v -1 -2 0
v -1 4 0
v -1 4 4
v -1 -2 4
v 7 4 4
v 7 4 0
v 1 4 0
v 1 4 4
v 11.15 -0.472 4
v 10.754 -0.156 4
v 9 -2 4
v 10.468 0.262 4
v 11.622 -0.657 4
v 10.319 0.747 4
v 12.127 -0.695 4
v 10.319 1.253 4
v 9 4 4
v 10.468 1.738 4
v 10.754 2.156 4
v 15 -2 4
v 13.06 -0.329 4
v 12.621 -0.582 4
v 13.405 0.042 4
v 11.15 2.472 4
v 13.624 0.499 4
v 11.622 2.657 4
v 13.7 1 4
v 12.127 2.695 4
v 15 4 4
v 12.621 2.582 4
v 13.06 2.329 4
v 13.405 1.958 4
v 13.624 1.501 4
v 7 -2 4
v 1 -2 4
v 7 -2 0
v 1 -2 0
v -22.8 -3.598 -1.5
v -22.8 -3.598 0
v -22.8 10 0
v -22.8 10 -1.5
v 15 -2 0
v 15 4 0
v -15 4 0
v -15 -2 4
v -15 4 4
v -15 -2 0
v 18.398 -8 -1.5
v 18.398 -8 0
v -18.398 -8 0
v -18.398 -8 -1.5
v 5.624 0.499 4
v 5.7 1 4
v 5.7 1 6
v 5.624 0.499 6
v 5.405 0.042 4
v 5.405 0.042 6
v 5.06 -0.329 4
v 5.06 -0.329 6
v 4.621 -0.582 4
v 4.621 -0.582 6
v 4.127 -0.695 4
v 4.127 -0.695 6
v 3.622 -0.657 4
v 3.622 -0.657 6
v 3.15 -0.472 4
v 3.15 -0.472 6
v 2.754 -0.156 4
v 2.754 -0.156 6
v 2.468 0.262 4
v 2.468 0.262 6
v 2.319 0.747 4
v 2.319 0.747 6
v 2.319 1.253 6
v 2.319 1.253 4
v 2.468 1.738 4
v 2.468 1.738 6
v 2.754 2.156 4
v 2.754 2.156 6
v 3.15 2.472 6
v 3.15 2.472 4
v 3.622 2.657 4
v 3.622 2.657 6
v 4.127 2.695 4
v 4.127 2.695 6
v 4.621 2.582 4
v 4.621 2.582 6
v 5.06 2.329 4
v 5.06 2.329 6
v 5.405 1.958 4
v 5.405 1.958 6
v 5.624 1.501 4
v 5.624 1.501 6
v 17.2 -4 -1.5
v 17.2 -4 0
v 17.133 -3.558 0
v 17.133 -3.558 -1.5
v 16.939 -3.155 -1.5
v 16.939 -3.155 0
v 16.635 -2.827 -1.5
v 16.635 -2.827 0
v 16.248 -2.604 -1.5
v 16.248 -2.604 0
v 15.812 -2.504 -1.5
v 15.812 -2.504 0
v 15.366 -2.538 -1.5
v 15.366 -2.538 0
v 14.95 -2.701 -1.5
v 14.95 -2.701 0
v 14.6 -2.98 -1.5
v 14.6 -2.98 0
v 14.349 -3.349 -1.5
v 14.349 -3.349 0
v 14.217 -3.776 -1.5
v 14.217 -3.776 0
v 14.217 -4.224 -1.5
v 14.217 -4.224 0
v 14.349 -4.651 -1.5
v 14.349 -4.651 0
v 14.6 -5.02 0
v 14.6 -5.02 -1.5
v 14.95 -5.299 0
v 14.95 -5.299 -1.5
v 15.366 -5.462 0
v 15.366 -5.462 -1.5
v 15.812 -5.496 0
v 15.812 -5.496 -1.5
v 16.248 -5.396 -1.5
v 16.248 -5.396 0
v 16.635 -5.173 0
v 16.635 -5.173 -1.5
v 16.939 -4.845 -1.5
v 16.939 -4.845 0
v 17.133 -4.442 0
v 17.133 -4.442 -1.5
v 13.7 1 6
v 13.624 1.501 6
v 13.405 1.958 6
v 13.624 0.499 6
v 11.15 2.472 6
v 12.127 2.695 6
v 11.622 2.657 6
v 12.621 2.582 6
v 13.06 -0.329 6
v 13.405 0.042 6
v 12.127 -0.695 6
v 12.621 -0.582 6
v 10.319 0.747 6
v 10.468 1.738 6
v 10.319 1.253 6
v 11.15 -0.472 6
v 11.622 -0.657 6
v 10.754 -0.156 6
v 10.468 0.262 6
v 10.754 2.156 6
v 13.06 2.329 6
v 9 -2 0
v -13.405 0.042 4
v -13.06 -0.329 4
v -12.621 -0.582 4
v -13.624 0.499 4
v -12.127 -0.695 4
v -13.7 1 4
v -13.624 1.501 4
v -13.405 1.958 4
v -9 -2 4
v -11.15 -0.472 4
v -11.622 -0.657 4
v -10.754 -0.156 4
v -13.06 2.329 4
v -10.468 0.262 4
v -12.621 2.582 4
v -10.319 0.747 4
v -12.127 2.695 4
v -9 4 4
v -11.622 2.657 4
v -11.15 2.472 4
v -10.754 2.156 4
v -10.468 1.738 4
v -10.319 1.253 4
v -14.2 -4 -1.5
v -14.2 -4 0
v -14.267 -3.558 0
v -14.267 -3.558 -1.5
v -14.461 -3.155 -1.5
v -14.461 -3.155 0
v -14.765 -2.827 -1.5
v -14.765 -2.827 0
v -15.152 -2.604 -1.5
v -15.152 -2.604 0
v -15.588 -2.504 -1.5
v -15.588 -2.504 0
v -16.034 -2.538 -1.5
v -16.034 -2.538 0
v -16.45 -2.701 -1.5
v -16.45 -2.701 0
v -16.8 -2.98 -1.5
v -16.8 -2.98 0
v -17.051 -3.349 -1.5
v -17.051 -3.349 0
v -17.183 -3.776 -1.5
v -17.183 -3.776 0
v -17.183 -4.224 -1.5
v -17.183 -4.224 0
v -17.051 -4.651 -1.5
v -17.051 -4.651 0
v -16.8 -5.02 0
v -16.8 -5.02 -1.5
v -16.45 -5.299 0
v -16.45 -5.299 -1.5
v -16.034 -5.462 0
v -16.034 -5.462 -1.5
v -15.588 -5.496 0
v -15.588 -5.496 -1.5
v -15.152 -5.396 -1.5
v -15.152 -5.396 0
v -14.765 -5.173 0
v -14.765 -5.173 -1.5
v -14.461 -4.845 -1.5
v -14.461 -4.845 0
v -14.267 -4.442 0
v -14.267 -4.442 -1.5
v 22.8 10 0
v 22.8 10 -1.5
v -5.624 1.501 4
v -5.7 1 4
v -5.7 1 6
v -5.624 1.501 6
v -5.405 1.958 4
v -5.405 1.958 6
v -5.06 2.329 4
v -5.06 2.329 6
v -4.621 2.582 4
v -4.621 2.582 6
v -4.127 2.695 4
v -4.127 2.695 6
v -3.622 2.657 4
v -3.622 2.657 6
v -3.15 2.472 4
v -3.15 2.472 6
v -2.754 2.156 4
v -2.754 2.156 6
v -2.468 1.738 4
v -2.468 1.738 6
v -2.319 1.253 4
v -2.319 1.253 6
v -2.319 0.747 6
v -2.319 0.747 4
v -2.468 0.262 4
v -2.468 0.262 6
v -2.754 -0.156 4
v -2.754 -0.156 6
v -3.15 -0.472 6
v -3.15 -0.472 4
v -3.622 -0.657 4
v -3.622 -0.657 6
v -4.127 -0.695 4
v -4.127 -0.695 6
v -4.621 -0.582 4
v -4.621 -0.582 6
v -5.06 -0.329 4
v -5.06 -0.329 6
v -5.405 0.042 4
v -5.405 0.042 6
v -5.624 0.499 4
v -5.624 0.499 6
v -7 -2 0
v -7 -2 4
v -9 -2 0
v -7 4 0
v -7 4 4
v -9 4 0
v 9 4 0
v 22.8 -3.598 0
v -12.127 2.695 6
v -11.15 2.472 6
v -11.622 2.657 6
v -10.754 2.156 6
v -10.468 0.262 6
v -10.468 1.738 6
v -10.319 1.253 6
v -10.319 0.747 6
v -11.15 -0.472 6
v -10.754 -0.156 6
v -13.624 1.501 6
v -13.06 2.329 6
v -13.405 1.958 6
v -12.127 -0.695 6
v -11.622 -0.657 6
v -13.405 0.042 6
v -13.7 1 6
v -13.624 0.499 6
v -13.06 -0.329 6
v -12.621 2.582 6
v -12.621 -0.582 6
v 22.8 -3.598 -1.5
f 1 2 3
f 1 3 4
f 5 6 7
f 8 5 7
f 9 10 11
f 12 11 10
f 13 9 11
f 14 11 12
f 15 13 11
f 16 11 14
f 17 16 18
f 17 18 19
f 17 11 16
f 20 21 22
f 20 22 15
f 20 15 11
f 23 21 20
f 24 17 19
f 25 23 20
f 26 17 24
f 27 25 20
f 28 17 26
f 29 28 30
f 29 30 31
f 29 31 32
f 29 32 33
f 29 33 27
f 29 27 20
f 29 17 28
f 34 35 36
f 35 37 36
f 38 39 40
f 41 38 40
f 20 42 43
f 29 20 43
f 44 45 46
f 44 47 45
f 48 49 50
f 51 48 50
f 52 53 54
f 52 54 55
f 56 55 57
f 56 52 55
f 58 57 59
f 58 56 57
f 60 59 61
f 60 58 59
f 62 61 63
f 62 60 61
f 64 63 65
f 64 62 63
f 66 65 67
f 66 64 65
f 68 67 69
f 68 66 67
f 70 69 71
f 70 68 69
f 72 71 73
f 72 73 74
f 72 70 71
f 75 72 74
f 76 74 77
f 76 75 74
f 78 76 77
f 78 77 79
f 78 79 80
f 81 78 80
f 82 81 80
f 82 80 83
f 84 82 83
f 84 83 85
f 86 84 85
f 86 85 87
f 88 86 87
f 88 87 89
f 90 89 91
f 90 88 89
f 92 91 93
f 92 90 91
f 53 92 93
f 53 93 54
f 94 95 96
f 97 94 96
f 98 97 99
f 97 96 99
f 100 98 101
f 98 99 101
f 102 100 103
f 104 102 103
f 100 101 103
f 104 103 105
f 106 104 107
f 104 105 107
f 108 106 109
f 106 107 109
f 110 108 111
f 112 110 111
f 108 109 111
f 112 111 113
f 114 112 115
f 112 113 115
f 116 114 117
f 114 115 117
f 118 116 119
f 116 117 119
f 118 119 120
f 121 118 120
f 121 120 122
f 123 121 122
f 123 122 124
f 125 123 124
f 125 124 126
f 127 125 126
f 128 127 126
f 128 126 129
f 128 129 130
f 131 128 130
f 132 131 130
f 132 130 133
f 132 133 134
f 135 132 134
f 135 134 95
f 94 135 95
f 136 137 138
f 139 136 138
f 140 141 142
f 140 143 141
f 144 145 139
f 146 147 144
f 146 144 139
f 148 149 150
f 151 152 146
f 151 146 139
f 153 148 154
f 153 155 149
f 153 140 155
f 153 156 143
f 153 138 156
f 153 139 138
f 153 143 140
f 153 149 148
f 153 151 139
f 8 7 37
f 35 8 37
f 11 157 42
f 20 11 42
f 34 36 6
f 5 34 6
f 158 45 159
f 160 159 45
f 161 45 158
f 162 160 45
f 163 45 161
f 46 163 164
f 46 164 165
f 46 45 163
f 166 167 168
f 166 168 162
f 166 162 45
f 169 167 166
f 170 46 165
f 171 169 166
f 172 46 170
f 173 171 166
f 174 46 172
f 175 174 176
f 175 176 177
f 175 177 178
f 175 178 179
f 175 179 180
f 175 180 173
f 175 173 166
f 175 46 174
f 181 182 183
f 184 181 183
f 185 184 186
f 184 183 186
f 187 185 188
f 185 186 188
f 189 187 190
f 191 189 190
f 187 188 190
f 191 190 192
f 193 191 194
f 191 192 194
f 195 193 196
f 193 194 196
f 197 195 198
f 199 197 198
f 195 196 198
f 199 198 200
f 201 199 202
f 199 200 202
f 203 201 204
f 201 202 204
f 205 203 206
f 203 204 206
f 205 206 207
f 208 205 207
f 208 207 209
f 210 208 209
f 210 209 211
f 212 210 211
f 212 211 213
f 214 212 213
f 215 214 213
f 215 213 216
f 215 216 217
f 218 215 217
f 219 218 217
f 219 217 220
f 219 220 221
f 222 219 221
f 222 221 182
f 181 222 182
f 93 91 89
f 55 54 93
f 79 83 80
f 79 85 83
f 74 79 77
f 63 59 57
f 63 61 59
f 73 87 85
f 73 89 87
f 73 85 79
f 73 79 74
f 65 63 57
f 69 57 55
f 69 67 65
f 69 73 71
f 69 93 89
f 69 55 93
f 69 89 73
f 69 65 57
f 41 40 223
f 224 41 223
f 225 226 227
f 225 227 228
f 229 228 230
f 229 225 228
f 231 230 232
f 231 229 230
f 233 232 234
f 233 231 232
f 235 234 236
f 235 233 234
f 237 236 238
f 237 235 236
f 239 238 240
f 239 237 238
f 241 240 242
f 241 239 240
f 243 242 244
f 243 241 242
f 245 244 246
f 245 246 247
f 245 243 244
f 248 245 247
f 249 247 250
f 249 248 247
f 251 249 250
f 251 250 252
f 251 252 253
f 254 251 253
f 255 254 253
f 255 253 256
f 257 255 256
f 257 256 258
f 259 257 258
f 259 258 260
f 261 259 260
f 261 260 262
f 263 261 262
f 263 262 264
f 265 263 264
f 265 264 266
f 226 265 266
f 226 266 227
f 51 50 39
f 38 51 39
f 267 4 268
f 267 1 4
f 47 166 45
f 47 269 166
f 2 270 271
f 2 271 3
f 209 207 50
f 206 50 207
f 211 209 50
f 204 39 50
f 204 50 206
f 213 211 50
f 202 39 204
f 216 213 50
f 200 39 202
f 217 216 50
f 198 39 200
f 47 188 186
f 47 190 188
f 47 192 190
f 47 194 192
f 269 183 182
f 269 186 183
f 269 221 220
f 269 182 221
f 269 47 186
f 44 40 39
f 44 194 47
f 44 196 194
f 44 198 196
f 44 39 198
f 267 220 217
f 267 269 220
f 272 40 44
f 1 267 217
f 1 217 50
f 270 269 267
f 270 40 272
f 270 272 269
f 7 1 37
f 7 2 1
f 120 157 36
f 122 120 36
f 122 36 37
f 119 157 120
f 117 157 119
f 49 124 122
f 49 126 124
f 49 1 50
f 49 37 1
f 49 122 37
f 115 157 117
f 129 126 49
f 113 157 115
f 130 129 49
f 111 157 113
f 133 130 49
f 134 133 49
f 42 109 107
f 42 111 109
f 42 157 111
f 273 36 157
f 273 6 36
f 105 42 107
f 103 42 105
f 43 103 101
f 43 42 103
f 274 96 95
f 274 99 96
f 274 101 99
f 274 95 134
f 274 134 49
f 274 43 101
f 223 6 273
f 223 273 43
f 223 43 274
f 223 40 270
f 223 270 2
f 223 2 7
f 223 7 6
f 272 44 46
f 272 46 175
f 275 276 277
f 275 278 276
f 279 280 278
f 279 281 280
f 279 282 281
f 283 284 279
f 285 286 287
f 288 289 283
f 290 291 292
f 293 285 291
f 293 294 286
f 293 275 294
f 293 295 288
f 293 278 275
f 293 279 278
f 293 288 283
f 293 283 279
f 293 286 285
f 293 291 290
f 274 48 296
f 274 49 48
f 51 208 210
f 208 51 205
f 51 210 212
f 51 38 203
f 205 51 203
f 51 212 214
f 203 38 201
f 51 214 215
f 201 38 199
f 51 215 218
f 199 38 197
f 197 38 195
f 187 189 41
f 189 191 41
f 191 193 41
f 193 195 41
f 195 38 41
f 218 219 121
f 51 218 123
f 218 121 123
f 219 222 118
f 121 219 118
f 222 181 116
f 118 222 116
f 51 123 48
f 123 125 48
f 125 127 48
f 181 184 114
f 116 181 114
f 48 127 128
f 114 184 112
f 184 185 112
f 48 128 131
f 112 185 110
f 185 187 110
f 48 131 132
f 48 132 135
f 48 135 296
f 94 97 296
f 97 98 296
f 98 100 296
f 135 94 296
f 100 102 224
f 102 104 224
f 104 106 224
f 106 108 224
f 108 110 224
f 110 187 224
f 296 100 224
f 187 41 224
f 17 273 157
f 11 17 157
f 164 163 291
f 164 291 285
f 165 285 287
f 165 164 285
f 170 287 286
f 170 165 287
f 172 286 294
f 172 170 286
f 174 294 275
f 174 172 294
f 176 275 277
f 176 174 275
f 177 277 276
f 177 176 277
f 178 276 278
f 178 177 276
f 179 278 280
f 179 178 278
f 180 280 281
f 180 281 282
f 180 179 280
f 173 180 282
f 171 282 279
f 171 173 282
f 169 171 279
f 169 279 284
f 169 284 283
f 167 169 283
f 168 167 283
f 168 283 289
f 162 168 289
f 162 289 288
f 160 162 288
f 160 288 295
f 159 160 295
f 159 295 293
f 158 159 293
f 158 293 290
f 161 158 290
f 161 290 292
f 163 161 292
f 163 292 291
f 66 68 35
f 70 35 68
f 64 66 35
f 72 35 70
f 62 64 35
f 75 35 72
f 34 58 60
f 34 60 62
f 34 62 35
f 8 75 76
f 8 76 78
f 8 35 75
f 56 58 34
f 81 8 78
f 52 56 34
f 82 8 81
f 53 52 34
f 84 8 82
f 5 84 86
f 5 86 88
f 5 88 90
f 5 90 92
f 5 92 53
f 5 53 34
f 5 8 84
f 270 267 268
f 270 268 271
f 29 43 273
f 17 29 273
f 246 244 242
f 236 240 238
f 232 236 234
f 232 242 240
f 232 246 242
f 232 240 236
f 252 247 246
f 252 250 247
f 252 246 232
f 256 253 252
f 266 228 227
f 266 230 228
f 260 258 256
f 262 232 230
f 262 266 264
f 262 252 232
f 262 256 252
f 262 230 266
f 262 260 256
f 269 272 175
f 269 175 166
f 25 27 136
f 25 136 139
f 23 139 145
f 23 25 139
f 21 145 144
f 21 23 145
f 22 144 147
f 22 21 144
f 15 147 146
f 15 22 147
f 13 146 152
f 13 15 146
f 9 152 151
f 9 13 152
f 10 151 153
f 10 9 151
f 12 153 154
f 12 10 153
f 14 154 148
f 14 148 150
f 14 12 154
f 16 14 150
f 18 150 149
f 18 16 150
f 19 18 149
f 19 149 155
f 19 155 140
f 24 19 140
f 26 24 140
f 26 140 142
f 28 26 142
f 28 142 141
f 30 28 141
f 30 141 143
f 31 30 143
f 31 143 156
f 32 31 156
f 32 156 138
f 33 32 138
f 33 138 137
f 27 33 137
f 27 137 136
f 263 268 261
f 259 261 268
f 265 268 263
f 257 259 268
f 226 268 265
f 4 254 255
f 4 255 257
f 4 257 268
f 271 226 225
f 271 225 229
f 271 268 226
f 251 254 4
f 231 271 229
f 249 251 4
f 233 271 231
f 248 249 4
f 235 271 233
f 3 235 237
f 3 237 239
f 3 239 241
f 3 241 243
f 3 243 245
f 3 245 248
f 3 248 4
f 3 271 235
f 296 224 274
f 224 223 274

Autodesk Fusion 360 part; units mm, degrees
sketch "Sketch1" plane through (0, 0, 0) normal (0, 0, 1) x (1, 0, 0)
  line L0 (-22.8, 10) -> (22.8, 10)
  line L1 (22.8, 10) -> (22.8, -10)
  line L2 (22.8, -10) -> (-22.8, -10)
  line L3 (-22.8, -10) -> (-22.8, 10)
  line L4 (-22.8, 10) -> (22.8, -10) construction
  line L5 (-15, 4) -> (-9, 4)
  line L6 (-9, 4) -> (-9, -2)
  line L7 (-9, -2) -> (-15, -2)
  line L8 (-15, -2) -> (-15, 4)
  line L9 (0, 10) -> (0, -10) construction
  line L10 (-1, -2) -> (-7, -2)
  line L11 (-7, -2) -> (-7, 4)
  line L12 (-7, 4) -> (-1, 4)
  line L13 (-1, 4) -> (-1, -2)
  line L14 (7, 4) -> (1, 4)
  line L15 (1, 4) -> (1, -2)
  line L16 (1, -2) -> (7, -2)
  line L17 (7, -2) -> (7, 4)
  line L18 (15, 4) -> (9, 4)
  line L19 (9, 4) -> (9, -2)
  line L20 (15, -2) -> (15, 4)
  line L21 (9, -2) -> (15, -2)
  circle A0 centre (-15.7, -4) radius 1.5
  circle A1 centre (15.7, -4) radius 1.5
  line L22 (-15.7, -4) -> (15.7, -4) construction
  dimension "d1" = 45.6
  dimension "d2" = 20
  dimension "d3" = 6
  dimension "d4" = 6
  dimension "d5" = 2
  dimension "d6" = 1
  dimension "d7" = 6
  dimension "d33" = 7.1
  dimension "d34" = 3
  dimension "d37" = 3
  dimension "d38" = 6
  dimension "d59" = 7.1
extrude "Extrude7" add sketch "Sketch1" against normal blind 1.5 contours L0 L1 L2 L3 | L5 L6 L7 L8 | L10 L11 L12 L13 | L14 L15 L16 L17 | L18 L19 L20 L21
extrude "Extrude8" add sketch "Sketch1" along normal blind 4 contours L5 L6 L7 L8 | L10 L11 L12 L13 | L14 L15 L16 L17 | L18 L19 L20 L21
sketch "Sketch6" plane through (0, 0, 4) normal (0, 0, 1) x (-1, 0, 0)
  line L0 (15, 2) -> (9, 2)
  line L1 (9, 2) -> (9, -4)
  line L2 (9, -4) -> (15, -4)
  line L3 (15, -4) -> (15, 2)
  line L4 (15, -4) -> (9, 2) construction
  circle A0 centre (12, -1) radius 1.7
  dimension "d44" = 3.4
sketch "Sketch7" plane through (0, 0, 4) normal (0, 0, 1) x (-1, 0, 0)
  line L0 (1, -4) -> (7, -4)
  line L1 (7, -4) -> (7, 2)
  line L2 (7, 2) -> (1, 2)
  line L3 (1, 2) -> (1, -4)
  line L4 (7, -4) -> (1, 2) construction
  circle A0 centre (4, -1) radius 1.7
  dimension "d45" = 3.4
extrude "Extrude9" add sketch "Sketch6" sketch "Sketch7" along normal blind 2 contours A0 of sketch 2 contours A0
mirror "Mirror2" about plane through (0, 0, 0) normal (1, 0, 0) of "Extrude9"
sketch "Sketch8" plane through (0, 0, 0) normal (0, 0, 1) x (-1, 0, 0)
  line L0 (-9, 2) -> (-9, -4)
  line L1 (-9, -4) -> (-15, -4)
  line L2 (-15, -4) -> (-15, 2)
  line L3 (-15, 2) -> (-9, 2)
  line L4 (15, 2) -> (15, -4)
  line L5 (15, -4) -> (9, -4)
  line L6 (9, -4) -> (9, 2)
  line L7 (9, 2) -> (15, 2)
  line L8 (-7, 2) -> (-1, 2)
  line L9 (-1, 2) -> (-1, -4)
  line L10 (-1, -4) -> (-7, -4)
  line L11 (-7, -4) -> (-7, 2)
  line L12 (1, -4) -> (1, 2)
  line L13 (1, 2) -> (7, 2)
  line L14 (7, 2) -> (7, -4)
  line L15 (7, -4) -> (1, -4)
  circle A0 centre (15.7, 4) radius 1.5
  circle A1 centre (-15.7, 4) radius 1.5
  line L16 (22.8, 10) -> (-22.8, 10)
  line L17 (-22.8, 10) -> (-22.8, -10)
  line L18 (-22.8, -10) -> (22.8, -10)
  line L19 (22.8, -10) -> (22.8, 10)
  line L20 (16.3985, 10) -> (22.8, 3.5985)
  line L21 (15.7, 4) -> (19.5993, 6.7993) construction
  line L22 (0, 0) -> (0, -10) construction
  line L23 (-16.3985, 10) -> (-22.8, 3.5985)
  dimension "d51" = 45
  dimension "d52" = 4.8
extrude "Extrude10" cut sketch "Sketch8" against normal blind 1.5 contours L16 L19 L20 | L16 L17 L23
move_face "OffsetFaces1" offset -2 1 faces at (5.4662, -10, -0.5)
extrude "Extrude1" [suppressed]
extrude "Extrude2" [suppressed]
sketch "Sketch2" plane through (0, 0, 4) normal (0, 0, 1) x (-1, 0, 0)
  line L0 (15, 2) -> (9, 2)
  line L1 (9, 2) -> (9, -4)
  line L2 (9, -4) -> (15, -4)
  line L3 (15, -4) -> (15, 2)
  circle A0 centre (12, -1) radius 2
  line L4 (15, -4) -> (9, 2) construction
  dimension "d12" = 4
extrude "Extrude3" [suppressed]
sketch "Sketch3" plane through (0, 0, 4) normal (0, 0, 1) x (-1, 0, 0)
  line L0 (1, -4) -> (7, -4)
  line L1 (7, -4) -> (7, 2)
  line L2 (7, 2) -> (1, 2)
  line L3 (1, 2) -> (1, -4)
  line L4 (7, -4) -> (1, 2) construction
  circle A0 centre (4, -1) radius 2
  dimension "d15" = 4
extrude "Extrude4" [suppressed]
mirror "Mirror1" [suppressed]
sketch "Sketch4" plane through (0, 0, 0) normal (0, 0, 1) x (-1, 0, 0)
  line L0 (-9, 2) -> (-9, -4)
  line L1 (-9, -4) -> (-15, -4)
  line L2 (-15, -4) -> (-15, 2)
  line L3 (-15, 2) -> (-9, 2)
  line L4 (15, 2) -> (15, -4)
  line L5 (15, -4) -> (9, -4)
  line L6 (9, -4) -> (9, 2)
  line L7 (9, 2) -> (15, 2)
  line L8 (-7, 2) -> (-1, 2)
  line L9 (-1, 2) -> (-1, -4)
  line L10 (-1, -4) -> (-7, -4)
  line L11 (-7, -4) -> (-7, 2)
  line L12 (1, -4) -> (1, 2)
  line L13 (1, 2) -> (7, 2)
  line L14 (7, 2) -> (7, -4)
  line L15 (7, -4) -> (1, -4)
  line L16 (22.8, 10) -> (-22.8, 10)
  line L17 (-22.8, 10) -> (-22.8, -10)
  line L18 (-22.8, -10) -> (22.8, -10)
  line L19 (22.8, -10) -> (22.8, 10)
  circle A0 centre (-19.6, -3.8) radius 1.5
  circle A1 centre (17.3, 3.5) radius 1.5
  dimension "d20" = 3
  dimension "d21" = 3.2
  dimension "d22" = 6.2
  dimension "d23" = 3
  dimension "d24" = 6.5
  dimension "d25" = 5.5
extrude "Extrude5" [suppressed]
sketch "Sketch5" plane through (0, 0, 0) normal (0, 0, 1) x (-1, 0, 0)
  circle A0 centre (-19.6, -3.8) radius 1.5
  circle A1 centre (17.3, 3.5) radius 1.5
  line L0 (-9, 2) -> (-9, -4)
  line L1 (-9, -4) -> (-15, -4)
  line L2 (-15, -4) -> (-15, 2)
  line L3 (-15, 2) -> (-9, 2)
  line L4 (15, 2) -> (15, -4)
  line L5 (15, -4) -> (9, -4)
  line L6 (9, -4) -> (9, 2)
  line L7 (9, 2) -> (15, 2)
  line L8 (-7, 2) -> (-1, 2)
  line L9 (-1, 2) -> (-1, -4)
  line L10 (-1, -4) -> (-7, -4)
  line L11 (-7, -4) -> (-7, 2)
  line L12 (1, -4) -> (1, 2)
  line L13 (1, 2) -> (7, 2)
  line L14 (7, 2) -> (7, -4)
  line L15 (7, -4) -> (1, -4)
  line L16 (22.8, 10) -> (-22.8, 10)
  line L17 (-22.8, 10) -> (-22.8, -10)
  line L18 (-22.8, -10) -> (22.8, -10)
  line L19 (22.8, -10) -> (22.8, 10)
  line L20 (14.3, 3.2) -> (-22.8, 3.2)
  line L21 (-22.8, 3.2) -> (-22.8, 10)
  line L22 (-22.8, 10) -> (14.3, 10)
  line L23 (14.3, 10) -> (14.3, 3.2)
  dimension "d28" = 6.8
  dimension "d29" = 8.5
extrude "Extrude6" [suppressed]
equation "d22 = 4.7 mm + 1.5 mm"
